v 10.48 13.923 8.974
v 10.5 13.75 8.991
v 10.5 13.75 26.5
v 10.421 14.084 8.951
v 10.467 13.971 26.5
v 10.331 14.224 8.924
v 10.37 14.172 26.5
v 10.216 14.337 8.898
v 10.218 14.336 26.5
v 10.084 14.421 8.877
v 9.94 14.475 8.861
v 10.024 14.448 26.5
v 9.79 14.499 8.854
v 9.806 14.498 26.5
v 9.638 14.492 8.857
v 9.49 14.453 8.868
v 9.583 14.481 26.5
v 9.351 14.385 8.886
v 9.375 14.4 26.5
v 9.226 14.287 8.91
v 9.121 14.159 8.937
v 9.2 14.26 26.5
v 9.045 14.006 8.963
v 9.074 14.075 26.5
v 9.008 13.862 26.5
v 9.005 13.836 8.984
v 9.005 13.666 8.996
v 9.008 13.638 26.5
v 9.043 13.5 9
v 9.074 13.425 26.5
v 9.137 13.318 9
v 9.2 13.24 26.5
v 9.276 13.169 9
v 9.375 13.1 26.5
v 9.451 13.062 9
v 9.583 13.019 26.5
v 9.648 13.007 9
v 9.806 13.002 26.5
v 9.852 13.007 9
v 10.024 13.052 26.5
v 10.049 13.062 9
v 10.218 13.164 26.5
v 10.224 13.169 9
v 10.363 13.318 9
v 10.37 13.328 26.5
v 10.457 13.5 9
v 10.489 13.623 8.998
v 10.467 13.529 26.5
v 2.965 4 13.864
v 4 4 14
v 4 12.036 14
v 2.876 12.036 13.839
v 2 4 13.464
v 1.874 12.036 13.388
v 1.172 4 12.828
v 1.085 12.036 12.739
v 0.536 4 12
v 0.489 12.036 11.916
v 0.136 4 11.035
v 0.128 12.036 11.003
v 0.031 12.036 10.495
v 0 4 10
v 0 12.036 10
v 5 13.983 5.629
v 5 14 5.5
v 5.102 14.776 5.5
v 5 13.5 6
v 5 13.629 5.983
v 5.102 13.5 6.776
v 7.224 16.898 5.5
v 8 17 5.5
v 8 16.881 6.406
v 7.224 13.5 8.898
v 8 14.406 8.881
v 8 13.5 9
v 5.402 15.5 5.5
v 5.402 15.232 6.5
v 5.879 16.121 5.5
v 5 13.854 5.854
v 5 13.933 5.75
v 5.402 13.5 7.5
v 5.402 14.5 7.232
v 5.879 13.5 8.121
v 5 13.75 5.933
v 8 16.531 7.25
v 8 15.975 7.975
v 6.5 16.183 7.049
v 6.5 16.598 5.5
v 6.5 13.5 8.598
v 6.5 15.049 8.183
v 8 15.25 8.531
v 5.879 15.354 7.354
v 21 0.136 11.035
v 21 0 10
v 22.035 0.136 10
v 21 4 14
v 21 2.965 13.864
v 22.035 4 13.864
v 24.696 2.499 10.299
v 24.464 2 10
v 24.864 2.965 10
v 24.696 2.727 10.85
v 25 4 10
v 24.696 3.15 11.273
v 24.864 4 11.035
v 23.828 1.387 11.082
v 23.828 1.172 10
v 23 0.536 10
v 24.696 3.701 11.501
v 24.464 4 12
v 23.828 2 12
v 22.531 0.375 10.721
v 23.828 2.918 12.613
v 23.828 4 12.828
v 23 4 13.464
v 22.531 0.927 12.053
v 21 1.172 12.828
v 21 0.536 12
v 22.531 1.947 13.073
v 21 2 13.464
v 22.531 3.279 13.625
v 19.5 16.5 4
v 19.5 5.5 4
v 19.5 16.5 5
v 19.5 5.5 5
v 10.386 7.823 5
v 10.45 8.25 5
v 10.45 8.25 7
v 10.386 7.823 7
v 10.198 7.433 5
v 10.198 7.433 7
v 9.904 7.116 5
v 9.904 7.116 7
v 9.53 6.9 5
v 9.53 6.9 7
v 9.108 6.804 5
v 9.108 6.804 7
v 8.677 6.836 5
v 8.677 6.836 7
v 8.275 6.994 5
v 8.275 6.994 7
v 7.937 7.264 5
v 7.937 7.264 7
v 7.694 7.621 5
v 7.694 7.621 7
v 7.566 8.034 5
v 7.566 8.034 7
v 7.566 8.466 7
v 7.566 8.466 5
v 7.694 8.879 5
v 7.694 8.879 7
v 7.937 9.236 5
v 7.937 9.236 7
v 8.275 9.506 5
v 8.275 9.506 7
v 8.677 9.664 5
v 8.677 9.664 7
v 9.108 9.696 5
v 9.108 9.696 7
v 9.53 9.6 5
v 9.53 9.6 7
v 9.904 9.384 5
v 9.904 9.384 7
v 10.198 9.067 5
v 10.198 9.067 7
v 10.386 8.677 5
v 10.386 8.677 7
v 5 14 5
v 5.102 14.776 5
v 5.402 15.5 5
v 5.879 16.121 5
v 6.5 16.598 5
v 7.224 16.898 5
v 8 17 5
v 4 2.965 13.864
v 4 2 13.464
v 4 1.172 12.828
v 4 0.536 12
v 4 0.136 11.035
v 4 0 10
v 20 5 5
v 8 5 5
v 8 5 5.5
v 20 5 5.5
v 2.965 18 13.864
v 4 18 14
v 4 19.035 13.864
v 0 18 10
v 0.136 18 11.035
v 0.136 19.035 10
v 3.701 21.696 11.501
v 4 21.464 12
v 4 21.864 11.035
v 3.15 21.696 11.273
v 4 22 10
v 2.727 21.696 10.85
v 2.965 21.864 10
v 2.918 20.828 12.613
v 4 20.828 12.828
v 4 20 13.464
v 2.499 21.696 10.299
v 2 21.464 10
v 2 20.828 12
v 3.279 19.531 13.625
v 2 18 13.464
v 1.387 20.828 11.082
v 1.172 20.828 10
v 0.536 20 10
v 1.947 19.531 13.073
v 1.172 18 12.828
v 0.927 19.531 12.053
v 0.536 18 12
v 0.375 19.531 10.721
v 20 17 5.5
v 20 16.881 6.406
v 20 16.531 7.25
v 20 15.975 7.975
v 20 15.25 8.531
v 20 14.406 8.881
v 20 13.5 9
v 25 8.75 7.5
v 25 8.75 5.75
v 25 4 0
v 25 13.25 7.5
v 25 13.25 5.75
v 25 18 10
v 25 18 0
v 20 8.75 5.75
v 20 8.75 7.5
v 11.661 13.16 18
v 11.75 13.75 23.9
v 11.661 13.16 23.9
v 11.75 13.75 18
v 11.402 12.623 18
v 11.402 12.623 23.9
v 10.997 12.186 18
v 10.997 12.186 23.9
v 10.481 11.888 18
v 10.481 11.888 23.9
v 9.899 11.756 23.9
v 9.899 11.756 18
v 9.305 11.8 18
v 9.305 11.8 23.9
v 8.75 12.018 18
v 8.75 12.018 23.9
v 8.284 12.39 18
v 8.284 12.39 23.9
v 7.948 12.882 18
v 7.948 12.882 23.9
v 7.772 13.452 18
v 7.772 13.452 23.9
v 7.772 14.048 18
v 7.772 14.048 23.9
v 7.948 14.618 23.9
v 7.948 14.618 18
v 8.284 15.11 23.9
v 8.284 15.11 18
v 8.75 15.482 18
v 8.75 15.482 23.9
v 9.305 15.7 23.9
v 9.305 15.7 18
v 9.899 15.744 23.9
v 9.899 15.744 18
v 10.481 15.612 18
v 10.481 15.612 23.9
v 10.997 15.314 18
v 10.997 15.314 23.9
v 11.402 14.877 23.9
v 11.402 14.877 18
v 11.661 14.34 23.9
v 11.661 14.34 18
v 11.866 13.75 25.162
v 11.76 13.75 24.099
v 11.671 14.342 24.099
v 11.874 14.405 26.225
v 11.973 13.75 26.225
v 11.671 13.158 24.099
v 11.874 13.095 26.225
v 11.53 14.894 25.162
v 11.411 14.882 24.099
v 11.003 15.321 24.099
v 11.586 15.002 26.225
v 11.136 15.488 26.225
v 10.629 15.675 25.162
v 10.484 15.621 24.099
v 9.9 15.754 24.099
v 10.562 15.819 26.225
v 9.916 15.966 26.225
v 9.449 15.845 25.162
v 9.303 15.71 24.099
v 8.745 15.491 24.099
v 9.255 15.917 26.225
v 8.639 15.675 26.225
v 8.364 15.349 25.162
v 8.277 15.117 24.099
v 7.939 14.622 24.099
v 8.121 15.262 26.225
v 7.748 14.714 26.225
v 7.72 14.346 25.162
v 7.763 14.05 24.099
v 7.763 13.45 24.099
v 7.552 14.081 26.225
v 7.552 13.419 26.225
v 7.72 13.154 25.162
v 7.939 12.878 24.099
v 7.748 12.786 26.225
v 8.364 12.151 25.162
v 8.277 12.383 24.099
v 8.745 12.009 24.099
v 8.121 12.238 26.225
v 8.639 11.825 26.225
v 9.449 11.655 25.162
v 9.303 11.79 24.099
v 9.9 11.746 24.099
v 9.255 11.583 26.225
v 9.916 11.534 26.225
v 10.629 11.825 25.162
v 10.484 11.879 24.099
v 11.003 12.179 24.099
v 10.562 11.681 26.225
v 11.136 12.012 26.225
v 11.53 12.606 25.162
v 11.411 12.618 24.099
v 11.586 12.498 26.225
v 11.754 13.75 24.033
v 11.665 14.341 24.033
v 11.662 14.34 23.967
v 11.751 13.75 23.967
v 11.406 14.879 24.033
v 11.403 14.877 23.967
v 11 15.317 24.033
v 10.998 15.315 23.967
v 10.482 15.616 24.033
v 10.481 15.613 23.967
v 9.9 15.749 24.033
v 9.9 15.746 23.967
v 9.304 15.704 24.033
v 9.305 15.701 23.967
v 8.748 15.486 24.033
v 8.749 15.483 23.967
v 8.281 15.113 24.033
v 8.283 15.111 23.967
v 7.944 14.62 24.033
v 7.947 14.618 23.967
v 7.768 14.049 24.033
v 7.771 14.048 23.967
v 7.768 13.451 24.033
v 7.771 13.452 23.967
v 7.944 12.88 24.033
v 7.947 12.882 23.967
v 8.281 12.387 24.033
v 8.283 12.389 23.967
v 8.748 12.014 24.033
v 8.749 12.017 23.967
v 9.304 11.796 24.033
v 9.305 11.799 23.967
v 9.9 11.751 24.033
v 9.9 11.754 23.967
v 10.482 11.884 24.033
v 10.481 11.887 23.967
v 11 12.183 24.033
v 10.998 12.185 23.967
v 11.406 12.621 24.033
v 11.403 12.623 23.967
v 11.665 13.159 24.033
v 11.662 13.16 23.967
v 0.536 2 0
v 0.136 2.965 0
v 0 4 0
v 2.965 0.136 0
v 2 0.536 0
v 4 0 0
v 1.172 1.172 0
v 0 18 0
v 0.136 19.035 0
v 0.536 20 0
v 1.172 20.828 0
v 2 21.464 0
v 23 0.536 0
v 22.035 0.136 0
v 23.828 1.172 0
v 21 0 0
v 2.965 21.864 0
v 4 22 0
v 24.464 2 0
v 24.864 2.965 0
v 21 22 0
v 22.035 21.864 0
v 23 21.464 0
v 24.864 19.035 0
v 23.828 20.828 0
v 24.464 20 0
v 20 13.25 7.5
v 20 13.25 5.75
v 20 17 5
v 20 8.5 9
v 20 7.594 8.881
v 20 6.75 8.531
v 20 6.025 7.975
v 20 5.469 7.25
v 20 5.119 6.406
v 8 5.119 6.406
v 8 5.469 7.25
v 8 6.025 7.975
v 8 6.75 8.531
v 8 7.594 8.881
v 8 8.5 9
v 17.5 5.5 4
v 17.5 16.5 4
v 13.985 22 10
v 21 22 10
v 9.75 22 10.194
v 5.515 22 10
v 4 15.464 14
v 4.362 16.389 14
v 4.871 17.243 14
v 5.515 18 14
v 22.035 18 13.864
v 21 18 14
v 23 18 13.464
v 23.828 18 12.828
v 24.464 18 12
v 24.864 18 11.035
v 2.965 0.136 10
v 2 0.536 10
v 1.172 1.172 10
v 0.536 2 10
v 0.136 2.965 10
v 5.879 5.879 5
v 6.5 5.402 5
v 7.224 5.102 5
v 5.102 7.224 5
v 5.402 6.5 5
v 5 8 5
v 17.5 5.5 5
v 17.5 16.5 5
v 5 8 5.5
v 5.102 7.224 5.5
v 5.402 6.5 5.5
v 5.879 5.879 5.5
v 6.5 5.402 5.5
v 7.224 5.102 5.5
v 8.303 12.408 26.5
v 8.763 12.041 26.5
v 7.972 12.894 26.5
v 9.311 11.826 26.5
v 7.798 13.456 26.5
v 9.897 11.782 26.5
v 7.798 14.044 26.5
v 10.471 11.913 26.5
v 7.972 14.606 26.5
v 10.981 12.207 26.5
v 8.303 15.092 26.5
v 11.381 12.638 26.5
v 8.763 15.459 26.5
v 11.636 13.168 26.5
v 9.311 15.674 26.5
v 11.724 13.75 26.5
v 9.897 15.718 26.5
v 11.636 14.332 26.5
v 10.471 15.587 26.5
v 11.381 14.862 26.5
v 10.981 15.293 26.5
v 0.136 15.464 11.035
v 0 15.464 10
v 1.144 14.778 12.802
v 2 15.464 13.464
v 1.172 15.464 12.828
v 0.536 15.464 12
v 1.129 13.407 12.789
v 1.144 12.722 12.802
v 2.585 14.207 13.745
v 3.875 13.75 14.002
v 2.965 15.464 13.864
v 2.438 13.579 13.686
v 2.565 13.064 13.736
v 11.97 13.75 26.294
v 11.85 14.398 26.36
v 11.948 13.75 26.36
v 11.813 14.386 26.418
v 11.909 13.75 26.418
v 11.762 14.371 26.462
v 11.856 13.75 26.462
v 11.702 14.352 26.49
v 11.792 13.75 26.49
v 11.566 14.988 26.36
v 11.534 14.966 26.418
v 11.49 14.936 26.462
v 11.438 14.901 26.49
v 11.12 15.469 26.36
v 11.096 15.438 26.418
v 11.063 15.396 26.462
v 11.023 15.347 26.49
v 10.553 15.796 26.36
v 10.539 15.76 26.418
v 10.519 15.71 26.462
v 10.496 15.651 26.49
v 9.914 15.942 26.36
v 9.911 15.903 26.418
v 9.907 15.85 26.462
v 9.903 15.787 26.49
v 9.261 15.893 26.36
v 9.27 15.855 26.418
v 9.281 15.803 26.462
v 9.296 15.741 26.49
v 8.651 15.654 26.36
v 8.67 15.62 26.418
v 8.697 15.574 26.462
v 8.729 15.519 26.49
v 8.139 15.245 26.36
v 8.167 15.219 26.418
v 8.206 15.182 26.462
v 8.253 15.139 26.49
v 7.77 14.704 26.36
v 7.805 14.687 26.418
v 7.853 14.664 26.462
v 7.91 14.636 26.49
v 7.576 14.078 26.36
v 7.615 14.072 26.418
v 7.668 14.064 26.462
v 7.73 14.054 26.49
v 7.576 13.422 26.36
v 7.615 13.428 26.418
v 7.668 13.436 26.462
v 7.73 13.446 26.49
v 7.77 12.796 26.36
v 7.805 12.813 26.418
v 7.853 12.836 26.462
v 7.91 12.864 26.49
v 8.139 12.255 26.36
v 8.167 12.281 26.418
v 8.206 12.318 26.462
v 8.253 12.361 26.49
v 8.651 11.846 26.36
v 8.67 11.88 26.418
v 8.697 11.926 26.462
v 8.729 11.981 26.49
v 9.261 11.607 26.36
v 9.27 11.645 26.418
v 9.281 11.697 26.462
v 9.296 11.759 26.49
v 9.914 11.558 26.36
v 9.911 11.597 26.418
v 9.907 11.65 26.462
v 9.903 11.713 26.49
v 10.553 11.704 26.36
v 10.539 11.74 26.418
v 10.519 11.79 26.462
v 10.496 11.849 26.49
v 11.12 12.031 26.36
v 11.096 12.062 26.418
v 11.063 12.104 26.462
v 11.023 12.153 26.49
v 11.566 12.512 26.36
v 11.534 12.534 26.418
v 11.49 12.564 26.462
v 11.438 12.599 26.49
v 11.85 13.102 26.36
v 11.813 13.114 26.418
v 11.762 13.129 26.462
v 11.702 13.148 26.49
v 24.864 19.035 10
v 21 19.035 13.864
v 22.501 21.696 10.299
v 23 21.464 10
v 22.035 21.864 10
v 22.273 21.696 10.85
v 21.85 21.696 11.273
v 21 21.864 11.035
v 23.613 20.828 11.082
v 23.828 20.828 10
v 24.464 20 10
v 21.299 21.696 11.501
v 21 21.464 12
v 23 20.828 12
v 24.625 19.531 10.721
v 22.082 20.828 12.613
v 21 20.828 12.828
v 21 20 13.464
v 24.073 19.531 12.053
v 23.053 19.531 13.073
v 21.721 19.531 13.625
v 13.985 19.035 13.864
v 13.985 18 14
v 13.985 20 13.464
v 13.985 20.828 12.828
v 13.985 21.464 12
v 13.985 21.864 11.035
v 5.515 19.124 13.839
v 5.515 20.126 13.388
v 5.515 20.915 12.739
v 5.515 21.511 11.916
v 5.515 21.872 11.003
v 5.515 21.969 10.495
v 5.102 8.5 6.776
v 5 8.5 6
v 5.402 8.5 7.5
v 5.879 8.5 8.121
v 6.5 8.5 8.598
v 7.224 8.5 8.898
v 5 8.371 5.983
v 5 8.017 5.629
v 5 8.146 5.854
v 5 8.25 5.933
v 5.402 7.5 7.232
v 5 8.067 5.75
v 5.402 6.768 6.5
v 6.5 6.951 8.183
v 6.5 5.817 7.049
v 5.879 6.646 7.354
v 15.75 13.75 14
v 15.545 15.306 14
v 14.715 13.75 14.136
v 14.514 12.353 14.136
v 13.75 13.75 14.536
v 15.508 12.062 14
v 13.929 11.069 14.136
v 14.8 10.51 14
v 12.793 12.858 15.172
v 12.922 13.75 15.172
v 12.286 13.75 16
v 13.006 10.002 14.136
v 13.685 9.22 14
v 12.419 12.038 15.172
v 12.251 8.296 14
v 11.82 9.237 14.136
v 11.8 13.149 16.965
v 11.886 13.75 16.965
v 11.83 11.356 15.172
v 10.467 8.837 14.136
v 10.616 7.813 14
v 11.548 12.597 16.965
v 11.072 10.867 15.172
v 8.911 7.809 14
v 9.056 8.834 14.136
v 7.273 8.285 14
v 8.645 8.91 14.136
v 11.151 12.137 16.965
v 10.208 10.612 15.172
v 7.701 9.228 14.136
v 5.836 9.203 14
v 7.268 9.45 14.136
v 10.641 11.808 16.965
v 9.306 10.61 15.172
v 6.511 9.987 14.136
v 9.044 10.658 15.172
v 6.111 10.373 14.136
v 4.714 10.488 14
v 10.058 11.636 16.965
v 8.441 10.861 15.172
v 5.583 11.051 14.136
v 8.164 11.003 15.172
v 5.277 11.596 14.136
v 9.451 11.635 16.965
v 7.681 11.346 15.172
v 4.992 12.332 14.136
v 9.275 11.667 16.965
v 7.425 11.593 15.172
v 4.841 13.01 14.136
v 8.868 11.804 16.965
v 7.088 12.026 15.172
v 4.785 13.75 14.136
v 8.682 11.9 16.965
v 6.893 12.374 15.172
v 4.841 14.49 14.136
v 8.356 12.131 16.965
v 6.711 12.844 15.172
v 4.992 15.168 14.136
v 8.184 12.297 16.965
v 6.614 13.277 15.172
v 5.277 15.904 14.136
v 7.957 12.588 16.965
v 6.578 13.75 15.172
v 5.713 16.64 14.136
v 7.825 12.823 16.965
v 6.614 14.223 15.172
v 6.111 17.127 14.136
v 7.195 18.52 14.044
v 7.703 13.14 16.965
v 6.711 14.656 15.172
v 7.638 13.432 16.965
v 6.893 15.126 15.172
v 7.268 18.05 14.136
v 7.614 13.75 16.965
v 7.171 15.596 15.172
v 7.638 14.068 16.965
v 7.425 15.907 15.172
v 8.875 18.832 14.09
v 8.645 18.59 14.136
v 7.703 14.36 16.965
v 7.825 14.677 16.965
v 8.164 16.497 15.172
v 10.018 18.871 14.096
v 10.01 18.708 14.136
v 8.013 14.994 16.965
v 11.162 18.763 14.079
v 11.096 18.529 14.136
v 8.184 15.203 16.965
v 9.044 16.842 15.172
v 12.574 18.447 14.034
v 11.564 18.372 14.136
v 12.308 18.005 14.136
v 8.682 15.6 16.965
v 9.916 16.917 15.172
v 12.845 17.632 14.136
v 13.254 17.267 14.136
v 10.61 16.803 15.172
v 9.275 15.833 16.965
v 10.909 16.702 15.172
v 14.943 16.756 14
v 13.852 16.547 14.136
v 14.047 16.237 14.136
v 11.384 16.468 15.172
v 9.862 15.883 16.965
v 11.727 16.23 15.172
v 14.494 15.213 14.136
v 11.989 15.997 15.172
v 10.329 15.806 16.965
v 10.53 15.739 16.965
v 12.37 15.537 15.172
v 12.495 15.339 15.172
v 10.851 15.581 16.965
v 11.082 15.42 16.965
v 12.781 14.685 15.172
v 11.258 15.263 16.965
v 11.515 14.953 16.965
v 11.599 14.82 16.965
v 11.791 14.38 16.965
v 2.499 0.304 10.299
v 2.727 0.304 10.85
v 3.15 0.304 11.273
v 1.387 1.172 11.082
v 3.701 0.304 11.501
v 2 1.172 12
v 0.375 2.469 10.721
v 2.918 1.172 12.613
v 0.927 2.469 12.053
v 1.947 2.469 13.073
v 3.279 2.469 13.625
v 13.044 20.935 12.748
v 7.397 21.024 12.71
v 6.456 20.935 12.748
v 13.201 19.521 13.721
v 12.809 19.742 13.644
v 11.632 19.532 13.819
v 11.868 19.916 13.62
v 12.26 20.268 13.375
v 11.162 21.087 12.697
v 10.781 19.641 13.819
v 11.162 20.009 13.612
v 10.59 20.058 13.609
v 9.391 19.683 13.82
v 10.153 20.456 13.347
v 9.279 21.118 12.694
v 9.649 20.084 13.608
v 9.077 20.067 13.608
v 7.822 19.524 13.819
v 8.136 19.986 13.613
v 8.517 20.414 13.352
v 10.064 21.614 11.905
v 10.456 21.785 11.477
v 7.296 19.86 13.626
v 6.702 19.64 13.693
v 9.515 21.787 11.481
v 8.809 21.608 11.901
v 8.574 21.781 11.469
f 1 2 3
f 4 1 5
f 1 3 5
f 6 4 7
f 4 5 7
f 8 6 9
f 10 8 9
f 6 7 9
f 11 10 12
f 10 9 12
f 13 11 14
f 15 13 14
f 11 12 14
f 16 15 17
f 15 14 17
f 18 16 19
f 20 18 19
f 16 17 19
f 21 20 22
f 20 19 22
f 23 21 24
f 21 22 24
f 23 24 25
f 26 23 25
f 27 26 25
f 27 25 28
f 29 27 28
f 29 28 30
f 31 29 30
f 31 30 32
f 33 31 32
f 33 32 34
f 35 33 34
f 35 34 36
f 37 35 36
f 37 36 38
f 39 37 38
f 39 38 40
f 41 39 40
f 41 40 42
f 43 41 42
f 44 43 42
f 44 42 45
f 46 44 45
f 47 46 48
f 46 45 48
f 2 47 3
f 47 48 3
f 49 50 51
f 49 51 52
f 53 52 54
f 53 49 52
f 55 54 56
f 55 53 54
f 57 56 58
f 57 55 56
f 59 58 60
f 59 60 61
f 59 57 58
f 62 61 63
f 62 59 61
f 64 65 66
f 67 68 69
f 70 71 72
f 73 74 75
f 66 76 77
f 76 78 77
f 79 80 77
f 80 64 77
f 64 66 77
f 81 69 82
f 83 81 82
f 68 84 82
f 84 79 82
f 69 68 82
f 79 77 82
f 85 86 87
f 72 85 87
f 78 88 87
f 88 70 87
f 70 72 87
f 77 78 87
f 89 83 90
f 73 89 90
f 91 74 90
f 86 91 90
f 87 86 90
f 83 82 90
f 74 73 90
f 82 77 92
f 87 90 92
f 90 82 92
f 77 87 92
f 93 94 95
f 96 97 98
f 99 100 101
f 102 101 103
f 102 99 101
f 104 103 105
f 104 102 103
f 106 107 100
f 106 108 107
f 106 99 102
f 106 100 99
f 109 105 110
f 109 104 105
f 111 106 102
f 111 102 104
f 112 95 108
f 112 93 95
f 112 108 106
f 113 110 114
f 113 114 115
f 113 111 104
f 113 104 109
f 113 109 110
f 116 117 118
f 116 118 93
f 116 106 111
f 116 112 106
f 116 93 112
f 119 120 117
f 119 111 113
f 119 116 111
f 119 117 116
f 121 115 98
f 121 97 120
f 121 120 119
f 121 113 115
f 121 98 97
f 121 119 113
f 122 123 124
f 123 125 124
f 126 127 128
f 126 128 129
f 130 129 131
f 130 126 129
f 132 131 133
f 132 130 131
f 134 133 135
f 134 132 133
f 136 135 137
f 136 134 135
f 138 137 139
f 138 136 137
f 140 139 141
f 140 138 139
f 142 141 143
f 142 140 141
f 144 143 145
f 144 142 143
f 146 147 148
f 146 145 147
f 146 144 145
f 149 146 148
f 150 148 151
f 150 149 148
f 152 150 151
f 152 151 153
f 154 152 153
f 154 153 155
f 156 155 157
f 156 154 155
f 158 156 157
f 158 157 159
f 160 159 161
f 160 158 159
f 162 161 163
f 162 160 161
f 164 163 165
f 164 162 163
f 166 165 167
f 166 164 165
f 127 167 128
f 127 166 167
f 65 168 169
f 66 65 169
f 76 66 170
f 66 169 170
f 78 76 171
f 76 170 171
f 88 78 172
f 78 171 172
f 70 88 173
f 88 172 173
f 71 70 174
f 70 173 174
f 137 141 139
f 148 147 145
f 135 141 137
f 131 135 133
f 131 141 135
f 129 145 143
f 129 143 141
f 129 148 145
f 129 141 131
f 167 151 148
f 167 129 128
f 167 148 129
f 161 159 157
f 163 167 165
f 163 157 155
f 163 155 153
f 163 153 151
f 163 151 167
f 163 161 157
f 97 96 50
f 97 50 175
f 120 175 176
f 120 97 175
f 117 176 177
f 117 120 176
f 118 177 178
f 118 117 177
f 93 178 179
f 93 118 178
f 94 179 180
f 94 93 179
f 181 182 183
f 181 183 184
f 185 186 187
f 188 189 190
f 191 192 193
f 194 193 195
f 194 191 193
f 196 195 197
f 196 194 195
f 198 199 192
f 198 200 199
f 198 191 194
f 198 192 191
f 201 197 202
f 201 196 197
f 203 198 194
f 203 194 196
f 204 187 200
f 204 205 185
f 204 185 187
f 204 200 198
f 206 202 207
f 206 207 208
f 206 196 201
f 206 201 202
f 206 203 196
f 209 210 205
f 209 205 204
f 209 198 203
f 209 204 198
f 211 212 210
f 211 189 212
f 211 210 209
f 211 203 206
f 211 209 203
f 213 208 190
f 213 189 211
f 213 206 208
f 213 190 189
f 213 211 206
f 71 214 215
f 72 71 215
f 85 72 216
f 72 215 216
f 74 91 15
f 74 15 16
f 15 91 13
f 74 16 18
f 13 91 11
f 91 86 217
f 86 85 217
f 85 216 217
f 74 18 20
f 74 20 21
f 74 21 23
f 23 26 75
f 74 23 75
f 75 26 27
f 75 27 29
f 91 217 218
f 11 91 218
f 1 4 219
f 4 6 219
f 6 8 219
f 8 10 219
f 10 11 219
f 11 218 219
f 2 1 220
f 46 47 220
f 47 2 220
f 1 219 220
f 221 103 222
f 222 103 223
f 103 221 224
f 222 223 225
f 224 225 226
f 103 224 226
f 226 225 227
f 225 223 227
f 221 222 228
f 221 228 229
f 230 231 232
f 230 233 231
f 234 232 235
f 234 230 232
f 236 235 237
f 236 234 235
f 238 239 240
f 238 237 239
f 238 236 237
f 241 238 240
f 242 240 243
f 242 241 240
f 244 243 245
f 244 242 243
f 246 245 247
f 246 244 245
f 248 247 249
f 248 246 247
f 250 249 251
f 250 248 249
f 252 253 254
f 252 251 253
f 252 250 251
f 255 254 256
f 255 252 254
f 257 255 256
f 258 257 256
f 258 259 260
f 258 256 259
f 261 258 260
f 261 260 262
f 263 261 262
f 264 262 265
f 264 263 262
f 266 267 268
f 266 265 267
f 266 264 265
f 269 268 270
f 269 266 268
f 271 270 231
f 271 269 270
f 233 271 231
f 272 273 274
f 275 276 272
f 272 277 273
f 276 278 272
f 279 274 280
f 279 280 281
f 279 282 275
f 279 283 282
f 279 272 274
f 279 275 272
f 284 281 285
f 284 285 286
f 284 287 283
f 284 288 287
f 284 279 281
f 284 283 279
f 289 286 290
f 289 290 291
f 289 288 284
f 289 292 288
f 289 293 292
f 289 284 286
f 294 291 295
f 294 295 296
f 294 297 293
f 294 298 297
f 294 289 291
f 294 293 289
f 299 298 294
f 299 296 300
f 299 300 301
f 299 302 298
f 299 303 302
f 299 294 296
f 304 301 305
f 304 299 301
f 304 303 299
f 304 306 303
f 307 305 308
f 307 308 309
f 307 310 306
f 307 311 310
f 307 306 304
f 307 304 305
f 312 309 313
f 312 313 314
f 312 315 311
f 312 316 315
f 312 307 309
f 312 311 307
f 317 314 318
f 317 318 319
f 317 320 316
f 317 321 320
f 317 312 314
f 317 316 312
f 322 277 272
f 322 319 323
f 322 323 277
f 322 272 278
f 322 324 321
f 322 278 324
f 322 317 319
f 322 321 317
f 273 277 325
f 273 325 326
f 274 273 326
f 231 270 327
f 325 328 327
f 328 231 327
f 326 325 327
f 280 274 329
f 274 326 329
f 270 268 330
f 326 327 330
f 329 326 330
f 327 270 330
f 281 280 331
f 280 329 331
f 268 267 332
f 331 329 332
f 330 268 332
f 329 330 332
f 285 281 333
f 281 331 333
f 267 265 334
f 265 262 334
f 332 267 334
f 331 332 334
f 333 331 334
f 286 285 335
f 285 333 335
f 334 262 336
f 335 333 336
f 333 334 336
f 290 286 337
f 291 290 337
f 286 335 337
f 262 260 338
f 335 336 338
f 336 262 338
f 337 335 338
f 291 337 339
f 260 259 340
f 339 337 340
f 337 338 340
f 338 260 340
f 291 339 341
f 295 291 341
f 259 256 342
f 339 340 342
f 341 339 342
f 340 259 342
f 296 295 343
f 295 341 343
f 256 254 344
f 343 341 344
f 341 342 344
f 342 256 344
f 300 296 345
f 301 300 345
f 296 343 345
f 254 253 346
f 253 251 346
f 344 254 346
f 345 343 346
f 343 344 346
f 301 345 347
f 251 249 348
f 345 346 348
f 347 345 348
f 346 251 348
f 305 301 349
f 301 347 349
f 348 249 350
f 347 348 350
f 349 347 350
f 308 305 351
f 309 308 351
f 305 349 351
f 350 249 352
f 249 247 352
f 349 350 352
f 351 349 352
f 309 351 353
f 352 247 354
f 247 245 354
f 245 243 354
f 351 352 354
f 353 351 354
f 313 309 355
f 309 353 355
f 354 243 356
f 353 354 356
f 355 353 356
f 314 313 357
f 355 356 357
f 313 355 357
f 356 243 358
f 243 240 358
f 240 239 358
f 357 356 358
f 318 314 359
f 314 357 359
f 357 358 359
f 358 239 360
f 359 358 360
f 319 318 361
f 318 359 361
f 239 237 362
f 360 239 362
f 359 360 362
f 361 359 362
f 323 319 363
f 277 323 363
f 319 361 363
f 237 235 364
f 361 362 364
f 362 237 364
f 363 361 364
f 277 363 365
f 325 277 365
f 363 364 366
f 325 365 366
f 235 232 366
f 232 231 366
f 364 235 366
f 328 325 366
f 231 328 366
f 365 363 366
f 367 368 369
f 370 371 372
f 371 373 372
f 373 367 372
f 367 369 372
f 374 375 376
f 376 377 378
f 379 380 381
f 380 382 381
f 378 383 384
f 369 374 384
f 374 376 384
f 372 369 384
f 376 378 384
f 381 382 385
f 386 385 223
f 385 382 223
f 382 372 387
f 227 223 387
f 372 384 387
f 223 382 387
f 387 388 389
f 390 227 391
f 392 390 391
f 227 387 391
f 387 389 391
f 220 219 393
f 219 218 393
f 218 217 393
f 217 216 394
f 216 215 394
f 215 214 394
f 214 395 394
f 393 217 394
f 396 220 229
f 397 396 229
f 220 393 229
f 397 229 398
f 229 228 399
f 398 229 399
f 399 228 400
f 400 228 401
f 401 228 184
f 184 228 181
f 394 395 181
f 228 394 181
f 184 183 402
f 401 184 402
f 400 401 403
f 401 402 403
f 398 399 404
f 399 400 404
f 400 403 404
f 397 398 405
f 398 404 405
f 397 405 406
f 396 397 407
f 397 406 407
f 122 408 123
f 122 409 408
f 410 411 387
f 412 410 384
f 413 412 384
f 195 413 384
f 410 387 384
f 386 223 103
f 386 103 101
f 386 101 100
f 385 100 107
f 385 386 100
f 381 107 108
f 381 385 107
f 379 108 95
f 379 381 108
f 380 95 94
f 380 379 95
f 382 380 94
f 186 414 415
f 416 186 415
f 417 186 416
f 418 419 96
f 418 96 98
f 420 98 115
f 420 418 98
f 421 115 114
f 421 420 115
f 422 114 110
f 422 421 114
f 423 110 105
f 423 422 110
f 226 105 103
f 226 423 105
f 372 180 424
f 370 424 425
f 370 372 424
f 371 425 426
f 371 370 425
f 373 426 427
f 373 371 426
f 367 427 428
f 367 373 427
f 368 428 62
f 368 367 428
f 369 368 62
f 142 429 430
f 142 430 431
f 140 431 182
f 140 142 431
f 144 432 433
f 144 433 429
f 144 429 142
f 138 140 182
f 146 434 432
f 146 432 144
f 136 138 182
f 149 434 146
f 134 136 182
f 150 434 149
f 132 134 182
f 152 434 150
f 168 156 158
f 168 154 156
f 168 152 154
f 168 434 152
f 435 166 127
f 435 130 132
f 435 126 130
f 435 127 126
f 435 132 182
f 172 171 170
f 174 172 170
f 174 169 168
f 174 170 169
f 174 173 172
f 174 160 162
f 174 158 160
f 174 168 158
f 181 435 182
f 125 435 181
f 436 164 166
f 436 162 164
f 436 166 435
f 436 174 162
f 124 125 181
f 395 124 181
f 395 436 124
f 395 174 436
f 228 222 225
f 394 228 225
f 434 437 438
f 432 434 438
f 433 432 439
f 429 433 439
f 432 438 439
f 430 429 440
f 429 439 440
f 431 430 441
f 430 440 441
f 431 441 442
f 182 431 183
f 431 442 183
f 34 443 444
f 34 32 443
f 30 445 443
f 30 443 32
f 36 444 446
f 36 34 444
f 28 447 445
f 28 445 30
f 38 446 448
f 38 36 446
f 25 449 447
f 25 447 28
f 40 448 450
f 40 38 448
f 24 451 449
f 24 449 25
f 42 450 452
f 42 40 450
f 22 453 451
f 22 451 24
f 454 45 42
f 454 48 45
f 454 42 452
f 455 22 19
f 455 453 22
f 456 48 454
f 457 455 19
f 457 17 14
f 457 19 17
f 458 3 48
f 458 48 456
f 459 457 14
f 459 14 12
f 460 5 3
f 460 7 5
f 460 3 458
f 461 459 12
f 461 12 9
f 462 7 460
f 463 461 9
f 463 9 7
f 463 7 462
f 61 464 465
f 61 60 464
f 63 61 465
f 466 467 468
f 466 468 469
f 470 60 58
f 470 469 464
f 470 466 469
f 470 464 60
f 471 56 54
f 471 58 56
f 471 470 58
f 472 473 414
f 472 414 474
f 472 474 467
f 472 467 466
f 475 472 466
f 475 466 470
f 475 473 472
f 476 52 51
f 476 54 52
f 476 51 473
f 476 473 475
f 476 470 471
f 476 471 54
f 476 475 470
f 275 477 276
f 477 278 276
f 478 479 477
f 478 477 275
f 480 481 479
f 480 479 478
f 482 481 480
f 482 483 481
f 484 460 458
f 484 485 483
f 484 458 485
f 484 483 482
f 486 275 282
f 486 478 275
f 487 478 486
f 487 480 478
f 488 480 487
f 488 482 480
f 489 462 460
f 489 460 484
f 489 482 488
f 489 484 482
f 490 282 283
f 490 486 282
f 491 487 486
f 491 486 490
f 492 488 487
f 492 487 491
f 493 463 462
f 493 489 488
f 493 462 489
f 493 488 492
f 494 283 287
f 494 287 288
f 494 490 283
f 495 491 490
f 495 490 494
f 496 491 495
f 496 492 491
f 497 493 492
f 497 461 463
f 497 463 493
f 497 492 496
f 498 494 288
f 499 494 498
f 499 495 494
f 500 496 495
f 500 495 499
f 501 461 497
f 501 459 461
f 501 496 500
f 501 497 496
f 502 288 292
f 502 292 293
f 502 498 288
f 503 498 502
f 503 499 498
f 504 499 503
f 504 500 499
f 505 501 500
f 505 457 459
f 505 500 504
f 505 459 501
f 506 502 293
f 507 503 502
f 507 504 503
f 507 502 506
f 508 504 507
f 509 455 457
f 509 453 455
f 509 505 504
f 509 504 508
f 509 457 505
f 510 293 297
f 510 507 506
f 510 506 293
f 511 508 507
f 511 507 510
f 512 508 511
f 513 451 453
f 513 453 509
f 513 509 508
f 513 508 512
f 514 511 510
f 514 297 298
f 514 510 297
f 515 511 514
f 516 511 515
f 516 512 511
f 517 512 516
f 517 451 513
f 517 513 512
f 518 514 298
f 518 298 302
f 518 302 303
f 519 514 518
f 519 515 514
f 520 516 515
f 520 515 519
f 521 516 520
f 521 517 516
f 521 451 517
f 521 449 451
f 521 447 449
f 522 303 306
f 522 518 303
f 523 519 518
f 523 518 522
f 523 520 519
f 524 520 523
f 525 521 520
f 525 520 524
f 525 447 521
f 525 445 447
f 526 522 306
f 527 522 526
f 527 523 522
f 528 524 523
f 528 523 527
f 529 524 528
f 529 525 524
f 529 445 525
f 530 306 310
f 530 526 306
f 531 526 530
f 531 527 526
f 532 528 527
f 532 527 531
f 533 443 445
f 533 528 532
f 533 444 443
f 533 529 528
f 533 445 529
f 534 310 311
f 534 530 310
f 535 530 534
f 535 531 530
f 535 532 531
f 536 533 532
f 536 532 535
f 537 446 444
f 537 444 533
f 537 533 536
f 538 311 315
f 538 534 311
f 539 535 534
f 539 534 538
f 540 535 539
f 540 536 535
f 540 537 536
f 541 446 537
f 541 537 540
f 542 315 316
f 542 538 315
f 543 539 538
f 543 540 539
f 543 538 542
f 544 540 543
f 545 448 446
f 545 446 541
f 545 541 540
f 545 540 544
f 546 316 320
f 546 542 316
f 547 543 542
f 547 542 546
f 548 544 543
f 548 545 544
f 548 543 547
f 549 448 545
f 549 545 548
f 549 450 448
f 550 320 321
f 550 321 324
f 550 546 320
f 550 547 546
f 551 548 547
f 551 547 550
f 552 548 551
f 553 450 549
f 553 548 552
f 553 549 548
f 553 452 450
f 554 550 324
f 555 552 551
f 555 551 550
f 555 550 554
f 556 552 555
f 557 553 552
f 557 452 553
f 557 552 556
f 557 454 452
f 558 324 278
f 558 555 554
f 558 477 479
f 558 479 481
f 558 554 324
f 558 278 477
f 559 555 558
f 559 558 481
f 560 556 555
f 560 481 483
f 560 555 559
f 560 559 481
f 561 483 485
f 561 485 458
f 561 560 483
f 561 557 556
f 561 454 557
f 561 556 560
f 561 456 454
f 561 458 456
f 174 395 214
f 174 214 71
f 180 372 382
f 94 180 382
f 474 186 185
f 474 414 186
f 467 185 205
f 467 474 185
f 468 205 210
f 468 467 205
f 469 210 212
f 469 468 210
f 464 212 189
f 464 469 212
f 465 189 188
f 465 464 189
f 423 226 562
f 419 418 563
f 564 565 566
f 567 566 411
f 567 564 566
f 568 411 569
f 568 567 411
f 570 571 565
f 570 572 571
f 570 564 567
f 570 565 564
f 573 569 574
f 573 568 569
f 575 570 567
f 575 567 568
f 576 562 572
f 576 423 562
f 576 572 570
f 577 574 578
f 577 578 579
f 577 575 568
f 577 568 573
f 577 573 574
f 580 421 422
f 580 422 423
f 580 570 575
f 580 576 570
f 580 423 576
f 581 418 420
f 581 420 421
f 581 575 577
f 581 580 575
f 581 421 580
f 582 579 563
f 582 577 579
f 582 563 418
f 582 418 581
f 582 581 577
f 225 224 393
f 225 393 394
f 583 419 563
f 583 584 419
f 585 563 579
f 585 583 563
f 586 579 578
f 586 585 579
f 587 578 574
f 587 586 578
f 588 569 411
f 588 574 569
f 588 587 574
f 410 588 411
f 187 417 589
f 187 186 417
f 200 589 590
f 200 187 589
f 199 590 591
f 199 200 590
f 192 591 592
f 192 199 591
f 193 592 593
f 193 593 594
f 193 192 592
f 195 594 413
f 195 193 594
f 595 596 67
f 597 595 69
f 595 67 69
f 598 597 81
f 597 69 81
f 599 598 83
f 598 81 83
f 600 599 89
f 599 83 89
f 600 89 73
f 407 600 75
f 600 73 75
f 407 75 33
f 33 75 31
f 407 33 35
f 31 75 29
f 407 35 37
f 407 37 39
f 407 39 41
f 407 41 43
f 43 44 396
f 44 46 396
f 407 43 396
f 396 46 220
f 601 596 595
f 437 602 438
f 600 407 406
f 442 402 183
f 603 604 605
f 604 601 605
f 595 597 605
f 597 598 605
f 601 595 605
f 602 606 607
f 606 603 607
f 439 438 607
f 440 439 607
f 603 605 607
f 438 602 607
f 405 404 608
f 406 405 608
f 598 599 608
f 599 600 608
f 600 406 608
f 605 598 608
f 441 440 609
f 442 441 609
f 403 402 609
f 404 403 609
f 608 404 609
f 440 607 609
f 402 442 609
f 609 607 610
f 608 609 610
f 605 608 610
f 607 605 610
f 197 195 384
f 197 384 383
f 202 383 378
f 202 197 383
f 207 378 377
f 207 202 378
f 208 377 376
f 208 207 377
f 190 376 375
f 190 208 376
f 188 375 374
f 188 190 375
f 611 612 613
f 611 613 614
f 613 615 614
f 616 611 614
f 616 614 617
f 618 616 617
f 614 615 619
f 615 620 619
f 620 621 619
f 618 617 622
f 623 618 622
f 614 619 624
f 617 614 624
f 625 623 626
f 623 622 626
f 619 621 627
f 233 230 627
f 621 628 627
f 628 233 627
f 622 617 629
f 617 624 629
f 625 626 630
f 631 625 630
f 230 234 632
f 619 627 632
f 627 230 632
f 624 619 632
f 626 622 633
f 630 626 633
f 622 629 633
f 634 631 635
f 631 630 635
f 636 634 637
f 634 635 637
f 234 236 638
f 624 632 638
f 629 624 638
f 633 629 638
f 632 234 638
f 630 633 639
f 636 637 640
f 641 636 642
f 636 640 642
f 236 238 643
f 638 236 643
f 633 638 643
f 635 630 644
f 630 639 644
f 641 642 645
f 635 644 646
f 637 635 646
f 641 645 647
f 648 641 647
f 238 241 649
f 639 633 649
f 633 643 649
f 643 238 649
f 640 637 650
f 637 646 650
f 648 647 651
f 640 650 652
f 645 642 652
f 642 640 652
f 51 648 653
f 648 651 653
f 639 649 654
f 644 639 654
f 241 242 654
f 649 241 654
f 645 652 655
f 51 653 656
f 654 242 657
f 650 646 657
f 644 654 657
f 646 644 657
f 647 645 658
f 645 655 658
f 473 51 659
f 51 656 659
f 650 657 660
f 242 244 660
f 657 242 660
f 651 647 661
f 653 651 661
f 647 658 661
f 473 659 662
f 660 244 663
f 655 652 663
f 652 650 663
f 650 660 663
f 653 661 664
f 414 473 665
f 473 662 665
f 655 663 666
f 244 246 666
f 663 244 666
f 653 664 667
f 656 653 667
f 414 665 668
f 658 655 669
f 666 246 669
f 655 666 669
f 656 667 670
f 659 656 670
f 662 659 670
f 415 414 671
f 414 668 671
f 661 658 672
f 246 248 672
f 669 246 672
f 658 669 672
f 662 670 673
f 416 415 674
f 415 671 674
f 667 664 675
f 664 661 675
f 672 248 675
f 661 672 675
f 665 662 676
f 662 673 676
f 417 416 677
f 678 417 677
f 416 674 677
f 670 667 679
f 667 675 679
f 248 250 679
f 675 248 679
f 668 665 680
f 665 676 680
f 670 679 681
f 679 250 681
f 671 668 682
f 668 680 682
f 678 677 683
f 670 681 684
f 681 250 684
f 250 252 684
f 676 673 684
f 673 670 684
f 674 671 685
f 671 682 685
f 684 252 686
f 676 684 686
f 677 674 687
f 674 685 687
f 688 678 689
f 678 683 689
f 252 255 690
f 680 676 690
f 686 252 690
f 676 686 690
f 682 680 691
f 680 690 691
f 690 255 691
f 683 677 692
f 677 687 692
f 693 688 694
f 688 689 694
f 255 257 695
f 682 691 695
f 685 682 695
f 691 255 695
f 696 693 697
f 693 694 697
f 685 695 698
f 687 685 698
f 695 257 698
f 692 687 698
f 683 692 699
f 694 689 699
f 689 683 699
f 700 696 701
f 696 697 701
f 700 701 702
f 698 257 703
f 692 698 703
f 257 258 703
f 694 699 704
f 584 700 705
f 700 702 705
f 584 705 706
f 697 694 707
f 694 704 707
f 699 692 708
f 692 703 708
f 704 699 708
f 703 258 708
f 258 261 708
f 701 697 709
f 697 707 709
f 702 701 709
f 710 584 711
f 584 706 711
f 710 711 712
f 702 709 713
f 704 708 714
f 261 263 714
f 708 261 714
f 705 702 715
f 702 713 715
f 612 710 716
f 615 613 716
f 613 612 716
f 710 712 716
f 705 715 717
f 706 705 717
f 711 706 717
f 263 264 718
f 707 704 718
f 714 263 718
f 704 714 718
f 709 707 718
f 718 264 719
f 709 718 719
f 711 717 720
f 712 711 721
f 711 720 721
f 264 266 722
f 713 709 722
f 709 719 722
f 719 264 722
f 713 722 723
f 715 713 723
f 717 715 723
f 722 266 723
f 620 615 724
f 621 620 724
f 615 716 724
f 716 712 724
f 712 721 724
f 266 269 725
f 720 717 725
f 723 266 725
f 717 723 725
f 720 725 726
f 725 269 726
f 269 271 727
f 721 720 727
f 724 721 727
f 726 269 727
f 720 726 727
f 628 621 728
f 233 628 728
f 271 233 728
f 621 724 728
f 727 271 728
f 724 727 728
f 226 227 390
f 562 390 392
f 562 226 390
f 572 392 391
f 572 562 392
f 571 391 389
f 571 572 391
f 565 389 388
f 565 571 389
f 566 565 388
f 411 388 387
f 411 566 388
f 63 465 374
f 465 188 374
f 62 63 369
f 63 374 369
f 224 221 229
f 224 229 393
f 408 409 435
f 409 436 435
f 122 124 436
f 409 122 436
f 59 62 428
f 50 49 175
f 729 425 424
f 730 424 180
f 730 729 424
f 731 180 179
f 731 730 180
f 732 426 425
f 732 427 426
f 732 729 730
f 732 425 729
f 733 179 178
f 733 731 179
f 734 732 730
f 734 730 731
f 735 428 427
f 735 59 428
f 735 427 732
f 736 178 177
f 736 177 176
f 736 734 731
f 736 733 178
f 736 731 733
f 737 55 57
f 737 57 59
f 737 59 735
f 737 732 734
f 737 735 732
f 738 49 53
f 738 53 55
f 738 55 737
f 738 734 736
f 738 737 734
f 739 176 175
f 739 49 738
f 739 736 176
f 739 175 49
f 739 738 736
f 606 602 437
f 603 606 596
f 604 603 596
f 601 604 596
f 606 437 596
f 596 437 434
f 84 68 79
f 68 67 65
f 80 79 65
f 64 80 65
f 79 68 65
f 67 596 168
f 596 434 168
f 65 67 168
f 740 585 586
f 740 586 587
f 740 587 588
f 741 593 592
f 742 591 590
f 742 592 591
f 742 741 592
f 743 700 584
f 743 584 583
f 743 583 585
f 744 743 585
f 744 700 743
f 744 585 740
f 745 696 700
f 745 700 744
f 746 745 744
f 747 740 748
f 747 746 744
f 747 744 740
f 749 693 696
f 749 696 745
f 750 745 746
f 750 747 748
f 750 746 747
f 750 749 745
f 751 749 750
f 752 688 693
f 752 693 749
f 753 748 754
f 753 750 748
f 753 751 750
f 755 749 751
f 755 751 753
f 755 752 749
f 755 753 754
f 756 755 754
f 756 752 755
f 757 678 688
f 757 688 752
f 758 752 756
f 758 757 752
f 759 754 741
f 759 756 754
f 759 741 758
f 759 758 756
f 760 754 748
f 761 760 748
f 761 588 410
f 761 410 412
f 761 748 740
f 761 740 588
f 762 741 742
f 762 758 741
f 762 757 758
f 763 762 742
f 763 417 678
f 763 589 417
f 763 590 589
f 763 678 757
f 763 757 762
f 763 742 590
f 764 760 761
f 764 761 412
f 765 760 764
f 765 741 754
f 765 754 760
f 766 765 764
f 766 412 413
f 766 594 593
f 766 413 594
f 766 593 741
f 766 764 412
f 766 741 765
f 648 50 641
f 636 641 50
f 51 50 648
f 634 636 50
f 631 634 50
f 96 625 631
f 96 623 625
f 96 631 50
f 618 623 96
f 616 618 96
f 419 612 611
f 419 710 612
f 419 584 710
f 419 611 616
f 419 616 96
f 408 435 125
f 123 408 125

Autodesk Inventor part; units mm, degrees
ref_plane "YZ Plane" through (0, 0, 0) normal (1, 0, 0) x (0, 1, 0)
sketch "Sketch1" plane through (0, 0, 0) normal (0, 0, 1) x (1, 0, 0)
  line L0 (0, 0) -> (25, 0)
  line L1 (25, 0) -> (25, 22)
  line L2 (25, 22) -> (0, 22)
  line L3 (0, 22) -> (0, 0)
  dimension "d0" = 25
  dimension "d1" = 22
extrude "Extrusion1" add sketch "Sketch1" along normal blind 5
sketch "Sketch2" plane through (0, 0, 5) normal (0, 0, 1) x (1, 0, 0)
  circle A0 centre (9, 8.25) radius 1.45
  line L0 (0, 0) -> (25, 0) projected
  line L1 (0, 22) -> (0, 0) projected
  dimension "d6" = 2.9
  dimension "d7" = 8.25
  dimension "d8" = 9
extrude "Extrusion2" add sketch "Sketch2" along normal blind 2
sketch "Sketch3" plane through (0, 0, 5) normal (0, 0, 1) x (1, 0, 0)
  line L0 (17.5, 5.5) -> (19.5, 5.5)
  line L1 (19.5, 5.5) -> (19.5, 16.5)
  line L2 (19.5, 16.5) -> (17.5, 16.5)
  line L3 (17.5, 16.5) -> (17.5, 5.5)
  line L4 (0, 0) -> (25, 0) projected
  line L5 (0, 22) -> (0, 0) projected
  circle A0 centre (9, 8.25) radius 1.45 construction
  dimension "d9" = 2
  dimension "d10" = 11
  dimension "d58" = 8.5
  dimension "d59" = 2.75
extrude "Extrusion3" cut sketch "Sketch3" against normal blind 1
sketch "Sketch4" plane through (0, 0, 5) normal (0, 0, 1) x (1, 0, 0)
  line L0 (0, 22) -> (25, 22)
  line L1 (25, 22) -> (25, 17)
  line L2 (25, 17) -> (0, 17)
  line L3 (0, 17) -> (0, 22)
  line L4 (25, 0) -> (25, 22) construction
  line L5 (25, 17) -> (20, 17)
  line L6 (20, 17) -> (20, 0)
  line L7 (20, 0) -> (25, 0)
  line L8 (25, 0) -> (25, 17)
  line L9 (0, 0) -> (25, 0) projected
  line L10 (20, 0) -> (0, 0)
  line L11 (0, 0) -> (0, 5)
  line L12 (0, 5) -> (20, 5)
  line L13 (20, 5) -> (20, 0)
  line L14 (0, 22) -> (0, 0) projected
  line L15 (0, 5) -> (5, 5)
  line L16 (5, 5) -> (5, 17)
  line L17 (5, 17) -> (0, 17)
  line L18 (0, 17) -> (0, 5)
  dimension "d16" = 5
  dimension "d17" = 5
  dimension "d18" = 5
  dimension "d19" = 5
extrude "Extrusion4" add sketch "Sketch4" along normal blind 4 contours L0 L1 L2 L3 | L2 L16 L12 L14 | L8 L7 L6 L2 | L12 L6 L9 L11
ref_plane "Work Plane2" through (0, 11, 0) normal (0, 1, 0) x (-1, 0, 0)
sketch "Sketch15" plane through (0, 0, 9) normal (0, 0, 1) x (1, 0, 0)
  line L0 (25, 22) -> (0, 22) projected
  line L1 (0, 22) -> (0, 0) projected
  line L2 (0, 0) -> (25, 0) projected
  line L3 (25, 0) -> (25, 22) projected
extrude "Extrusion15" add sketch "Sketch15" along normal blind 5
sketch "Sketch18" plane through (0, 0, 14) normal (0, 0, 1) x (1, 0, 0)
  circle A0 centre (9.75, 13.75) radius 2
  circle A1 centre (9, 8.25) radius 1.45 construction
  point P0 (0, 0)
  dimension "d70" = 4
  dimension "d107" = 5.5
  dimension "d108" = 0.75
extrude "Extrusion17" add sketch "Sketch18" along normal blind 10
fillet "Fillet5" radius 4 1 edges at (7.75, 13.75, 14)
fillet "Fillet6" radius 4 8 edges at (0, 11, 14) (12.5, 0, 14) (25, 11, 14) (12.5, 22, 14) (0, 0, 7) (25, 0, 7) (0, 22, 7) (25, 22, 7)
ref_plane "Work Plane4" through (9.75, 13.75, 26.5) normal (0, 0, 1) x (1, 0, 0)
sketch "Sketch21" plane through (9.75, 13.75, 26.5) normal (0, 0, 1) x (1, 0, 0)
  circle A0 centre (0, 0) radius 2 construction
  circle A1 centre (0, 0) radius 2.25
  point P0 (-9.75, -13.75)
  dimension "d91" = 0.25
loft "Loft3" add profiles "Sketch21" section 2 edges at (7.75, 13.75, 24)
fillet "Fillet8" radius 0.25 1 edges at (7.5, 13.75, 26.5)
fillet "Fillet9" radius 2 1 edges at (7.75, 13.75, 24)
sketch "Sketch22" plane through (9.75, 13.75, 26.5) normal (0, 0, 1) x (1, 0, 0)
  circle A0 centre (0, 0) radius 0.75
  point P0 (-9.75, -13.75)
  dimension "d98" = 1.5
extrude "Extrusion19" cut sketch "Sketch22" against normal blind 20
sketch "Sketch23" plane through (25, 4, 0) normal (1, 0, 0) x (0, 0, -1)
  line L0 (-9, 13) -> (-9, 1) construction
  line L1 (-5.75, 4.75) -> (-5.75, 9.25)
  line L2 (-7.5, 4.75) -> (-7.5, 9.25)
  line L3 (-5.75, 4.75) -> (-7.5, 4.75)
  line L4 (-5, 1.5) -> (-5, 12.5) projected
  line L5 (-7.5, 9.25) -> (-5.75, 9.25)
  point P0 (0, -4)
  point P1 (-9, 7)
  point P2 (-9, 7)
  dimension "d104" = 4.5
  dimension "d111" = 1.5
  dimension "d112" = 1.75
extrude "Extrusion20" cut sketch "Sketch23" against normal blind 5
fillet "Fillet10" radius 3.5 2 edges at (12.5, 17, 9) (12.5, 5, 9)
fillet "Fillet11" radius 3 5 edges at (5, 15.9749, 7.9749) (5, 17, 5.25) (5, 6.0251, 7.9749) (5, 5, 5.25) (5, 11, 9)
equation "\"d17\" = d16"
equation "\"d18\" = d16"
equation "\"d19\" = d16"
properties part number "DAQcapsule"
